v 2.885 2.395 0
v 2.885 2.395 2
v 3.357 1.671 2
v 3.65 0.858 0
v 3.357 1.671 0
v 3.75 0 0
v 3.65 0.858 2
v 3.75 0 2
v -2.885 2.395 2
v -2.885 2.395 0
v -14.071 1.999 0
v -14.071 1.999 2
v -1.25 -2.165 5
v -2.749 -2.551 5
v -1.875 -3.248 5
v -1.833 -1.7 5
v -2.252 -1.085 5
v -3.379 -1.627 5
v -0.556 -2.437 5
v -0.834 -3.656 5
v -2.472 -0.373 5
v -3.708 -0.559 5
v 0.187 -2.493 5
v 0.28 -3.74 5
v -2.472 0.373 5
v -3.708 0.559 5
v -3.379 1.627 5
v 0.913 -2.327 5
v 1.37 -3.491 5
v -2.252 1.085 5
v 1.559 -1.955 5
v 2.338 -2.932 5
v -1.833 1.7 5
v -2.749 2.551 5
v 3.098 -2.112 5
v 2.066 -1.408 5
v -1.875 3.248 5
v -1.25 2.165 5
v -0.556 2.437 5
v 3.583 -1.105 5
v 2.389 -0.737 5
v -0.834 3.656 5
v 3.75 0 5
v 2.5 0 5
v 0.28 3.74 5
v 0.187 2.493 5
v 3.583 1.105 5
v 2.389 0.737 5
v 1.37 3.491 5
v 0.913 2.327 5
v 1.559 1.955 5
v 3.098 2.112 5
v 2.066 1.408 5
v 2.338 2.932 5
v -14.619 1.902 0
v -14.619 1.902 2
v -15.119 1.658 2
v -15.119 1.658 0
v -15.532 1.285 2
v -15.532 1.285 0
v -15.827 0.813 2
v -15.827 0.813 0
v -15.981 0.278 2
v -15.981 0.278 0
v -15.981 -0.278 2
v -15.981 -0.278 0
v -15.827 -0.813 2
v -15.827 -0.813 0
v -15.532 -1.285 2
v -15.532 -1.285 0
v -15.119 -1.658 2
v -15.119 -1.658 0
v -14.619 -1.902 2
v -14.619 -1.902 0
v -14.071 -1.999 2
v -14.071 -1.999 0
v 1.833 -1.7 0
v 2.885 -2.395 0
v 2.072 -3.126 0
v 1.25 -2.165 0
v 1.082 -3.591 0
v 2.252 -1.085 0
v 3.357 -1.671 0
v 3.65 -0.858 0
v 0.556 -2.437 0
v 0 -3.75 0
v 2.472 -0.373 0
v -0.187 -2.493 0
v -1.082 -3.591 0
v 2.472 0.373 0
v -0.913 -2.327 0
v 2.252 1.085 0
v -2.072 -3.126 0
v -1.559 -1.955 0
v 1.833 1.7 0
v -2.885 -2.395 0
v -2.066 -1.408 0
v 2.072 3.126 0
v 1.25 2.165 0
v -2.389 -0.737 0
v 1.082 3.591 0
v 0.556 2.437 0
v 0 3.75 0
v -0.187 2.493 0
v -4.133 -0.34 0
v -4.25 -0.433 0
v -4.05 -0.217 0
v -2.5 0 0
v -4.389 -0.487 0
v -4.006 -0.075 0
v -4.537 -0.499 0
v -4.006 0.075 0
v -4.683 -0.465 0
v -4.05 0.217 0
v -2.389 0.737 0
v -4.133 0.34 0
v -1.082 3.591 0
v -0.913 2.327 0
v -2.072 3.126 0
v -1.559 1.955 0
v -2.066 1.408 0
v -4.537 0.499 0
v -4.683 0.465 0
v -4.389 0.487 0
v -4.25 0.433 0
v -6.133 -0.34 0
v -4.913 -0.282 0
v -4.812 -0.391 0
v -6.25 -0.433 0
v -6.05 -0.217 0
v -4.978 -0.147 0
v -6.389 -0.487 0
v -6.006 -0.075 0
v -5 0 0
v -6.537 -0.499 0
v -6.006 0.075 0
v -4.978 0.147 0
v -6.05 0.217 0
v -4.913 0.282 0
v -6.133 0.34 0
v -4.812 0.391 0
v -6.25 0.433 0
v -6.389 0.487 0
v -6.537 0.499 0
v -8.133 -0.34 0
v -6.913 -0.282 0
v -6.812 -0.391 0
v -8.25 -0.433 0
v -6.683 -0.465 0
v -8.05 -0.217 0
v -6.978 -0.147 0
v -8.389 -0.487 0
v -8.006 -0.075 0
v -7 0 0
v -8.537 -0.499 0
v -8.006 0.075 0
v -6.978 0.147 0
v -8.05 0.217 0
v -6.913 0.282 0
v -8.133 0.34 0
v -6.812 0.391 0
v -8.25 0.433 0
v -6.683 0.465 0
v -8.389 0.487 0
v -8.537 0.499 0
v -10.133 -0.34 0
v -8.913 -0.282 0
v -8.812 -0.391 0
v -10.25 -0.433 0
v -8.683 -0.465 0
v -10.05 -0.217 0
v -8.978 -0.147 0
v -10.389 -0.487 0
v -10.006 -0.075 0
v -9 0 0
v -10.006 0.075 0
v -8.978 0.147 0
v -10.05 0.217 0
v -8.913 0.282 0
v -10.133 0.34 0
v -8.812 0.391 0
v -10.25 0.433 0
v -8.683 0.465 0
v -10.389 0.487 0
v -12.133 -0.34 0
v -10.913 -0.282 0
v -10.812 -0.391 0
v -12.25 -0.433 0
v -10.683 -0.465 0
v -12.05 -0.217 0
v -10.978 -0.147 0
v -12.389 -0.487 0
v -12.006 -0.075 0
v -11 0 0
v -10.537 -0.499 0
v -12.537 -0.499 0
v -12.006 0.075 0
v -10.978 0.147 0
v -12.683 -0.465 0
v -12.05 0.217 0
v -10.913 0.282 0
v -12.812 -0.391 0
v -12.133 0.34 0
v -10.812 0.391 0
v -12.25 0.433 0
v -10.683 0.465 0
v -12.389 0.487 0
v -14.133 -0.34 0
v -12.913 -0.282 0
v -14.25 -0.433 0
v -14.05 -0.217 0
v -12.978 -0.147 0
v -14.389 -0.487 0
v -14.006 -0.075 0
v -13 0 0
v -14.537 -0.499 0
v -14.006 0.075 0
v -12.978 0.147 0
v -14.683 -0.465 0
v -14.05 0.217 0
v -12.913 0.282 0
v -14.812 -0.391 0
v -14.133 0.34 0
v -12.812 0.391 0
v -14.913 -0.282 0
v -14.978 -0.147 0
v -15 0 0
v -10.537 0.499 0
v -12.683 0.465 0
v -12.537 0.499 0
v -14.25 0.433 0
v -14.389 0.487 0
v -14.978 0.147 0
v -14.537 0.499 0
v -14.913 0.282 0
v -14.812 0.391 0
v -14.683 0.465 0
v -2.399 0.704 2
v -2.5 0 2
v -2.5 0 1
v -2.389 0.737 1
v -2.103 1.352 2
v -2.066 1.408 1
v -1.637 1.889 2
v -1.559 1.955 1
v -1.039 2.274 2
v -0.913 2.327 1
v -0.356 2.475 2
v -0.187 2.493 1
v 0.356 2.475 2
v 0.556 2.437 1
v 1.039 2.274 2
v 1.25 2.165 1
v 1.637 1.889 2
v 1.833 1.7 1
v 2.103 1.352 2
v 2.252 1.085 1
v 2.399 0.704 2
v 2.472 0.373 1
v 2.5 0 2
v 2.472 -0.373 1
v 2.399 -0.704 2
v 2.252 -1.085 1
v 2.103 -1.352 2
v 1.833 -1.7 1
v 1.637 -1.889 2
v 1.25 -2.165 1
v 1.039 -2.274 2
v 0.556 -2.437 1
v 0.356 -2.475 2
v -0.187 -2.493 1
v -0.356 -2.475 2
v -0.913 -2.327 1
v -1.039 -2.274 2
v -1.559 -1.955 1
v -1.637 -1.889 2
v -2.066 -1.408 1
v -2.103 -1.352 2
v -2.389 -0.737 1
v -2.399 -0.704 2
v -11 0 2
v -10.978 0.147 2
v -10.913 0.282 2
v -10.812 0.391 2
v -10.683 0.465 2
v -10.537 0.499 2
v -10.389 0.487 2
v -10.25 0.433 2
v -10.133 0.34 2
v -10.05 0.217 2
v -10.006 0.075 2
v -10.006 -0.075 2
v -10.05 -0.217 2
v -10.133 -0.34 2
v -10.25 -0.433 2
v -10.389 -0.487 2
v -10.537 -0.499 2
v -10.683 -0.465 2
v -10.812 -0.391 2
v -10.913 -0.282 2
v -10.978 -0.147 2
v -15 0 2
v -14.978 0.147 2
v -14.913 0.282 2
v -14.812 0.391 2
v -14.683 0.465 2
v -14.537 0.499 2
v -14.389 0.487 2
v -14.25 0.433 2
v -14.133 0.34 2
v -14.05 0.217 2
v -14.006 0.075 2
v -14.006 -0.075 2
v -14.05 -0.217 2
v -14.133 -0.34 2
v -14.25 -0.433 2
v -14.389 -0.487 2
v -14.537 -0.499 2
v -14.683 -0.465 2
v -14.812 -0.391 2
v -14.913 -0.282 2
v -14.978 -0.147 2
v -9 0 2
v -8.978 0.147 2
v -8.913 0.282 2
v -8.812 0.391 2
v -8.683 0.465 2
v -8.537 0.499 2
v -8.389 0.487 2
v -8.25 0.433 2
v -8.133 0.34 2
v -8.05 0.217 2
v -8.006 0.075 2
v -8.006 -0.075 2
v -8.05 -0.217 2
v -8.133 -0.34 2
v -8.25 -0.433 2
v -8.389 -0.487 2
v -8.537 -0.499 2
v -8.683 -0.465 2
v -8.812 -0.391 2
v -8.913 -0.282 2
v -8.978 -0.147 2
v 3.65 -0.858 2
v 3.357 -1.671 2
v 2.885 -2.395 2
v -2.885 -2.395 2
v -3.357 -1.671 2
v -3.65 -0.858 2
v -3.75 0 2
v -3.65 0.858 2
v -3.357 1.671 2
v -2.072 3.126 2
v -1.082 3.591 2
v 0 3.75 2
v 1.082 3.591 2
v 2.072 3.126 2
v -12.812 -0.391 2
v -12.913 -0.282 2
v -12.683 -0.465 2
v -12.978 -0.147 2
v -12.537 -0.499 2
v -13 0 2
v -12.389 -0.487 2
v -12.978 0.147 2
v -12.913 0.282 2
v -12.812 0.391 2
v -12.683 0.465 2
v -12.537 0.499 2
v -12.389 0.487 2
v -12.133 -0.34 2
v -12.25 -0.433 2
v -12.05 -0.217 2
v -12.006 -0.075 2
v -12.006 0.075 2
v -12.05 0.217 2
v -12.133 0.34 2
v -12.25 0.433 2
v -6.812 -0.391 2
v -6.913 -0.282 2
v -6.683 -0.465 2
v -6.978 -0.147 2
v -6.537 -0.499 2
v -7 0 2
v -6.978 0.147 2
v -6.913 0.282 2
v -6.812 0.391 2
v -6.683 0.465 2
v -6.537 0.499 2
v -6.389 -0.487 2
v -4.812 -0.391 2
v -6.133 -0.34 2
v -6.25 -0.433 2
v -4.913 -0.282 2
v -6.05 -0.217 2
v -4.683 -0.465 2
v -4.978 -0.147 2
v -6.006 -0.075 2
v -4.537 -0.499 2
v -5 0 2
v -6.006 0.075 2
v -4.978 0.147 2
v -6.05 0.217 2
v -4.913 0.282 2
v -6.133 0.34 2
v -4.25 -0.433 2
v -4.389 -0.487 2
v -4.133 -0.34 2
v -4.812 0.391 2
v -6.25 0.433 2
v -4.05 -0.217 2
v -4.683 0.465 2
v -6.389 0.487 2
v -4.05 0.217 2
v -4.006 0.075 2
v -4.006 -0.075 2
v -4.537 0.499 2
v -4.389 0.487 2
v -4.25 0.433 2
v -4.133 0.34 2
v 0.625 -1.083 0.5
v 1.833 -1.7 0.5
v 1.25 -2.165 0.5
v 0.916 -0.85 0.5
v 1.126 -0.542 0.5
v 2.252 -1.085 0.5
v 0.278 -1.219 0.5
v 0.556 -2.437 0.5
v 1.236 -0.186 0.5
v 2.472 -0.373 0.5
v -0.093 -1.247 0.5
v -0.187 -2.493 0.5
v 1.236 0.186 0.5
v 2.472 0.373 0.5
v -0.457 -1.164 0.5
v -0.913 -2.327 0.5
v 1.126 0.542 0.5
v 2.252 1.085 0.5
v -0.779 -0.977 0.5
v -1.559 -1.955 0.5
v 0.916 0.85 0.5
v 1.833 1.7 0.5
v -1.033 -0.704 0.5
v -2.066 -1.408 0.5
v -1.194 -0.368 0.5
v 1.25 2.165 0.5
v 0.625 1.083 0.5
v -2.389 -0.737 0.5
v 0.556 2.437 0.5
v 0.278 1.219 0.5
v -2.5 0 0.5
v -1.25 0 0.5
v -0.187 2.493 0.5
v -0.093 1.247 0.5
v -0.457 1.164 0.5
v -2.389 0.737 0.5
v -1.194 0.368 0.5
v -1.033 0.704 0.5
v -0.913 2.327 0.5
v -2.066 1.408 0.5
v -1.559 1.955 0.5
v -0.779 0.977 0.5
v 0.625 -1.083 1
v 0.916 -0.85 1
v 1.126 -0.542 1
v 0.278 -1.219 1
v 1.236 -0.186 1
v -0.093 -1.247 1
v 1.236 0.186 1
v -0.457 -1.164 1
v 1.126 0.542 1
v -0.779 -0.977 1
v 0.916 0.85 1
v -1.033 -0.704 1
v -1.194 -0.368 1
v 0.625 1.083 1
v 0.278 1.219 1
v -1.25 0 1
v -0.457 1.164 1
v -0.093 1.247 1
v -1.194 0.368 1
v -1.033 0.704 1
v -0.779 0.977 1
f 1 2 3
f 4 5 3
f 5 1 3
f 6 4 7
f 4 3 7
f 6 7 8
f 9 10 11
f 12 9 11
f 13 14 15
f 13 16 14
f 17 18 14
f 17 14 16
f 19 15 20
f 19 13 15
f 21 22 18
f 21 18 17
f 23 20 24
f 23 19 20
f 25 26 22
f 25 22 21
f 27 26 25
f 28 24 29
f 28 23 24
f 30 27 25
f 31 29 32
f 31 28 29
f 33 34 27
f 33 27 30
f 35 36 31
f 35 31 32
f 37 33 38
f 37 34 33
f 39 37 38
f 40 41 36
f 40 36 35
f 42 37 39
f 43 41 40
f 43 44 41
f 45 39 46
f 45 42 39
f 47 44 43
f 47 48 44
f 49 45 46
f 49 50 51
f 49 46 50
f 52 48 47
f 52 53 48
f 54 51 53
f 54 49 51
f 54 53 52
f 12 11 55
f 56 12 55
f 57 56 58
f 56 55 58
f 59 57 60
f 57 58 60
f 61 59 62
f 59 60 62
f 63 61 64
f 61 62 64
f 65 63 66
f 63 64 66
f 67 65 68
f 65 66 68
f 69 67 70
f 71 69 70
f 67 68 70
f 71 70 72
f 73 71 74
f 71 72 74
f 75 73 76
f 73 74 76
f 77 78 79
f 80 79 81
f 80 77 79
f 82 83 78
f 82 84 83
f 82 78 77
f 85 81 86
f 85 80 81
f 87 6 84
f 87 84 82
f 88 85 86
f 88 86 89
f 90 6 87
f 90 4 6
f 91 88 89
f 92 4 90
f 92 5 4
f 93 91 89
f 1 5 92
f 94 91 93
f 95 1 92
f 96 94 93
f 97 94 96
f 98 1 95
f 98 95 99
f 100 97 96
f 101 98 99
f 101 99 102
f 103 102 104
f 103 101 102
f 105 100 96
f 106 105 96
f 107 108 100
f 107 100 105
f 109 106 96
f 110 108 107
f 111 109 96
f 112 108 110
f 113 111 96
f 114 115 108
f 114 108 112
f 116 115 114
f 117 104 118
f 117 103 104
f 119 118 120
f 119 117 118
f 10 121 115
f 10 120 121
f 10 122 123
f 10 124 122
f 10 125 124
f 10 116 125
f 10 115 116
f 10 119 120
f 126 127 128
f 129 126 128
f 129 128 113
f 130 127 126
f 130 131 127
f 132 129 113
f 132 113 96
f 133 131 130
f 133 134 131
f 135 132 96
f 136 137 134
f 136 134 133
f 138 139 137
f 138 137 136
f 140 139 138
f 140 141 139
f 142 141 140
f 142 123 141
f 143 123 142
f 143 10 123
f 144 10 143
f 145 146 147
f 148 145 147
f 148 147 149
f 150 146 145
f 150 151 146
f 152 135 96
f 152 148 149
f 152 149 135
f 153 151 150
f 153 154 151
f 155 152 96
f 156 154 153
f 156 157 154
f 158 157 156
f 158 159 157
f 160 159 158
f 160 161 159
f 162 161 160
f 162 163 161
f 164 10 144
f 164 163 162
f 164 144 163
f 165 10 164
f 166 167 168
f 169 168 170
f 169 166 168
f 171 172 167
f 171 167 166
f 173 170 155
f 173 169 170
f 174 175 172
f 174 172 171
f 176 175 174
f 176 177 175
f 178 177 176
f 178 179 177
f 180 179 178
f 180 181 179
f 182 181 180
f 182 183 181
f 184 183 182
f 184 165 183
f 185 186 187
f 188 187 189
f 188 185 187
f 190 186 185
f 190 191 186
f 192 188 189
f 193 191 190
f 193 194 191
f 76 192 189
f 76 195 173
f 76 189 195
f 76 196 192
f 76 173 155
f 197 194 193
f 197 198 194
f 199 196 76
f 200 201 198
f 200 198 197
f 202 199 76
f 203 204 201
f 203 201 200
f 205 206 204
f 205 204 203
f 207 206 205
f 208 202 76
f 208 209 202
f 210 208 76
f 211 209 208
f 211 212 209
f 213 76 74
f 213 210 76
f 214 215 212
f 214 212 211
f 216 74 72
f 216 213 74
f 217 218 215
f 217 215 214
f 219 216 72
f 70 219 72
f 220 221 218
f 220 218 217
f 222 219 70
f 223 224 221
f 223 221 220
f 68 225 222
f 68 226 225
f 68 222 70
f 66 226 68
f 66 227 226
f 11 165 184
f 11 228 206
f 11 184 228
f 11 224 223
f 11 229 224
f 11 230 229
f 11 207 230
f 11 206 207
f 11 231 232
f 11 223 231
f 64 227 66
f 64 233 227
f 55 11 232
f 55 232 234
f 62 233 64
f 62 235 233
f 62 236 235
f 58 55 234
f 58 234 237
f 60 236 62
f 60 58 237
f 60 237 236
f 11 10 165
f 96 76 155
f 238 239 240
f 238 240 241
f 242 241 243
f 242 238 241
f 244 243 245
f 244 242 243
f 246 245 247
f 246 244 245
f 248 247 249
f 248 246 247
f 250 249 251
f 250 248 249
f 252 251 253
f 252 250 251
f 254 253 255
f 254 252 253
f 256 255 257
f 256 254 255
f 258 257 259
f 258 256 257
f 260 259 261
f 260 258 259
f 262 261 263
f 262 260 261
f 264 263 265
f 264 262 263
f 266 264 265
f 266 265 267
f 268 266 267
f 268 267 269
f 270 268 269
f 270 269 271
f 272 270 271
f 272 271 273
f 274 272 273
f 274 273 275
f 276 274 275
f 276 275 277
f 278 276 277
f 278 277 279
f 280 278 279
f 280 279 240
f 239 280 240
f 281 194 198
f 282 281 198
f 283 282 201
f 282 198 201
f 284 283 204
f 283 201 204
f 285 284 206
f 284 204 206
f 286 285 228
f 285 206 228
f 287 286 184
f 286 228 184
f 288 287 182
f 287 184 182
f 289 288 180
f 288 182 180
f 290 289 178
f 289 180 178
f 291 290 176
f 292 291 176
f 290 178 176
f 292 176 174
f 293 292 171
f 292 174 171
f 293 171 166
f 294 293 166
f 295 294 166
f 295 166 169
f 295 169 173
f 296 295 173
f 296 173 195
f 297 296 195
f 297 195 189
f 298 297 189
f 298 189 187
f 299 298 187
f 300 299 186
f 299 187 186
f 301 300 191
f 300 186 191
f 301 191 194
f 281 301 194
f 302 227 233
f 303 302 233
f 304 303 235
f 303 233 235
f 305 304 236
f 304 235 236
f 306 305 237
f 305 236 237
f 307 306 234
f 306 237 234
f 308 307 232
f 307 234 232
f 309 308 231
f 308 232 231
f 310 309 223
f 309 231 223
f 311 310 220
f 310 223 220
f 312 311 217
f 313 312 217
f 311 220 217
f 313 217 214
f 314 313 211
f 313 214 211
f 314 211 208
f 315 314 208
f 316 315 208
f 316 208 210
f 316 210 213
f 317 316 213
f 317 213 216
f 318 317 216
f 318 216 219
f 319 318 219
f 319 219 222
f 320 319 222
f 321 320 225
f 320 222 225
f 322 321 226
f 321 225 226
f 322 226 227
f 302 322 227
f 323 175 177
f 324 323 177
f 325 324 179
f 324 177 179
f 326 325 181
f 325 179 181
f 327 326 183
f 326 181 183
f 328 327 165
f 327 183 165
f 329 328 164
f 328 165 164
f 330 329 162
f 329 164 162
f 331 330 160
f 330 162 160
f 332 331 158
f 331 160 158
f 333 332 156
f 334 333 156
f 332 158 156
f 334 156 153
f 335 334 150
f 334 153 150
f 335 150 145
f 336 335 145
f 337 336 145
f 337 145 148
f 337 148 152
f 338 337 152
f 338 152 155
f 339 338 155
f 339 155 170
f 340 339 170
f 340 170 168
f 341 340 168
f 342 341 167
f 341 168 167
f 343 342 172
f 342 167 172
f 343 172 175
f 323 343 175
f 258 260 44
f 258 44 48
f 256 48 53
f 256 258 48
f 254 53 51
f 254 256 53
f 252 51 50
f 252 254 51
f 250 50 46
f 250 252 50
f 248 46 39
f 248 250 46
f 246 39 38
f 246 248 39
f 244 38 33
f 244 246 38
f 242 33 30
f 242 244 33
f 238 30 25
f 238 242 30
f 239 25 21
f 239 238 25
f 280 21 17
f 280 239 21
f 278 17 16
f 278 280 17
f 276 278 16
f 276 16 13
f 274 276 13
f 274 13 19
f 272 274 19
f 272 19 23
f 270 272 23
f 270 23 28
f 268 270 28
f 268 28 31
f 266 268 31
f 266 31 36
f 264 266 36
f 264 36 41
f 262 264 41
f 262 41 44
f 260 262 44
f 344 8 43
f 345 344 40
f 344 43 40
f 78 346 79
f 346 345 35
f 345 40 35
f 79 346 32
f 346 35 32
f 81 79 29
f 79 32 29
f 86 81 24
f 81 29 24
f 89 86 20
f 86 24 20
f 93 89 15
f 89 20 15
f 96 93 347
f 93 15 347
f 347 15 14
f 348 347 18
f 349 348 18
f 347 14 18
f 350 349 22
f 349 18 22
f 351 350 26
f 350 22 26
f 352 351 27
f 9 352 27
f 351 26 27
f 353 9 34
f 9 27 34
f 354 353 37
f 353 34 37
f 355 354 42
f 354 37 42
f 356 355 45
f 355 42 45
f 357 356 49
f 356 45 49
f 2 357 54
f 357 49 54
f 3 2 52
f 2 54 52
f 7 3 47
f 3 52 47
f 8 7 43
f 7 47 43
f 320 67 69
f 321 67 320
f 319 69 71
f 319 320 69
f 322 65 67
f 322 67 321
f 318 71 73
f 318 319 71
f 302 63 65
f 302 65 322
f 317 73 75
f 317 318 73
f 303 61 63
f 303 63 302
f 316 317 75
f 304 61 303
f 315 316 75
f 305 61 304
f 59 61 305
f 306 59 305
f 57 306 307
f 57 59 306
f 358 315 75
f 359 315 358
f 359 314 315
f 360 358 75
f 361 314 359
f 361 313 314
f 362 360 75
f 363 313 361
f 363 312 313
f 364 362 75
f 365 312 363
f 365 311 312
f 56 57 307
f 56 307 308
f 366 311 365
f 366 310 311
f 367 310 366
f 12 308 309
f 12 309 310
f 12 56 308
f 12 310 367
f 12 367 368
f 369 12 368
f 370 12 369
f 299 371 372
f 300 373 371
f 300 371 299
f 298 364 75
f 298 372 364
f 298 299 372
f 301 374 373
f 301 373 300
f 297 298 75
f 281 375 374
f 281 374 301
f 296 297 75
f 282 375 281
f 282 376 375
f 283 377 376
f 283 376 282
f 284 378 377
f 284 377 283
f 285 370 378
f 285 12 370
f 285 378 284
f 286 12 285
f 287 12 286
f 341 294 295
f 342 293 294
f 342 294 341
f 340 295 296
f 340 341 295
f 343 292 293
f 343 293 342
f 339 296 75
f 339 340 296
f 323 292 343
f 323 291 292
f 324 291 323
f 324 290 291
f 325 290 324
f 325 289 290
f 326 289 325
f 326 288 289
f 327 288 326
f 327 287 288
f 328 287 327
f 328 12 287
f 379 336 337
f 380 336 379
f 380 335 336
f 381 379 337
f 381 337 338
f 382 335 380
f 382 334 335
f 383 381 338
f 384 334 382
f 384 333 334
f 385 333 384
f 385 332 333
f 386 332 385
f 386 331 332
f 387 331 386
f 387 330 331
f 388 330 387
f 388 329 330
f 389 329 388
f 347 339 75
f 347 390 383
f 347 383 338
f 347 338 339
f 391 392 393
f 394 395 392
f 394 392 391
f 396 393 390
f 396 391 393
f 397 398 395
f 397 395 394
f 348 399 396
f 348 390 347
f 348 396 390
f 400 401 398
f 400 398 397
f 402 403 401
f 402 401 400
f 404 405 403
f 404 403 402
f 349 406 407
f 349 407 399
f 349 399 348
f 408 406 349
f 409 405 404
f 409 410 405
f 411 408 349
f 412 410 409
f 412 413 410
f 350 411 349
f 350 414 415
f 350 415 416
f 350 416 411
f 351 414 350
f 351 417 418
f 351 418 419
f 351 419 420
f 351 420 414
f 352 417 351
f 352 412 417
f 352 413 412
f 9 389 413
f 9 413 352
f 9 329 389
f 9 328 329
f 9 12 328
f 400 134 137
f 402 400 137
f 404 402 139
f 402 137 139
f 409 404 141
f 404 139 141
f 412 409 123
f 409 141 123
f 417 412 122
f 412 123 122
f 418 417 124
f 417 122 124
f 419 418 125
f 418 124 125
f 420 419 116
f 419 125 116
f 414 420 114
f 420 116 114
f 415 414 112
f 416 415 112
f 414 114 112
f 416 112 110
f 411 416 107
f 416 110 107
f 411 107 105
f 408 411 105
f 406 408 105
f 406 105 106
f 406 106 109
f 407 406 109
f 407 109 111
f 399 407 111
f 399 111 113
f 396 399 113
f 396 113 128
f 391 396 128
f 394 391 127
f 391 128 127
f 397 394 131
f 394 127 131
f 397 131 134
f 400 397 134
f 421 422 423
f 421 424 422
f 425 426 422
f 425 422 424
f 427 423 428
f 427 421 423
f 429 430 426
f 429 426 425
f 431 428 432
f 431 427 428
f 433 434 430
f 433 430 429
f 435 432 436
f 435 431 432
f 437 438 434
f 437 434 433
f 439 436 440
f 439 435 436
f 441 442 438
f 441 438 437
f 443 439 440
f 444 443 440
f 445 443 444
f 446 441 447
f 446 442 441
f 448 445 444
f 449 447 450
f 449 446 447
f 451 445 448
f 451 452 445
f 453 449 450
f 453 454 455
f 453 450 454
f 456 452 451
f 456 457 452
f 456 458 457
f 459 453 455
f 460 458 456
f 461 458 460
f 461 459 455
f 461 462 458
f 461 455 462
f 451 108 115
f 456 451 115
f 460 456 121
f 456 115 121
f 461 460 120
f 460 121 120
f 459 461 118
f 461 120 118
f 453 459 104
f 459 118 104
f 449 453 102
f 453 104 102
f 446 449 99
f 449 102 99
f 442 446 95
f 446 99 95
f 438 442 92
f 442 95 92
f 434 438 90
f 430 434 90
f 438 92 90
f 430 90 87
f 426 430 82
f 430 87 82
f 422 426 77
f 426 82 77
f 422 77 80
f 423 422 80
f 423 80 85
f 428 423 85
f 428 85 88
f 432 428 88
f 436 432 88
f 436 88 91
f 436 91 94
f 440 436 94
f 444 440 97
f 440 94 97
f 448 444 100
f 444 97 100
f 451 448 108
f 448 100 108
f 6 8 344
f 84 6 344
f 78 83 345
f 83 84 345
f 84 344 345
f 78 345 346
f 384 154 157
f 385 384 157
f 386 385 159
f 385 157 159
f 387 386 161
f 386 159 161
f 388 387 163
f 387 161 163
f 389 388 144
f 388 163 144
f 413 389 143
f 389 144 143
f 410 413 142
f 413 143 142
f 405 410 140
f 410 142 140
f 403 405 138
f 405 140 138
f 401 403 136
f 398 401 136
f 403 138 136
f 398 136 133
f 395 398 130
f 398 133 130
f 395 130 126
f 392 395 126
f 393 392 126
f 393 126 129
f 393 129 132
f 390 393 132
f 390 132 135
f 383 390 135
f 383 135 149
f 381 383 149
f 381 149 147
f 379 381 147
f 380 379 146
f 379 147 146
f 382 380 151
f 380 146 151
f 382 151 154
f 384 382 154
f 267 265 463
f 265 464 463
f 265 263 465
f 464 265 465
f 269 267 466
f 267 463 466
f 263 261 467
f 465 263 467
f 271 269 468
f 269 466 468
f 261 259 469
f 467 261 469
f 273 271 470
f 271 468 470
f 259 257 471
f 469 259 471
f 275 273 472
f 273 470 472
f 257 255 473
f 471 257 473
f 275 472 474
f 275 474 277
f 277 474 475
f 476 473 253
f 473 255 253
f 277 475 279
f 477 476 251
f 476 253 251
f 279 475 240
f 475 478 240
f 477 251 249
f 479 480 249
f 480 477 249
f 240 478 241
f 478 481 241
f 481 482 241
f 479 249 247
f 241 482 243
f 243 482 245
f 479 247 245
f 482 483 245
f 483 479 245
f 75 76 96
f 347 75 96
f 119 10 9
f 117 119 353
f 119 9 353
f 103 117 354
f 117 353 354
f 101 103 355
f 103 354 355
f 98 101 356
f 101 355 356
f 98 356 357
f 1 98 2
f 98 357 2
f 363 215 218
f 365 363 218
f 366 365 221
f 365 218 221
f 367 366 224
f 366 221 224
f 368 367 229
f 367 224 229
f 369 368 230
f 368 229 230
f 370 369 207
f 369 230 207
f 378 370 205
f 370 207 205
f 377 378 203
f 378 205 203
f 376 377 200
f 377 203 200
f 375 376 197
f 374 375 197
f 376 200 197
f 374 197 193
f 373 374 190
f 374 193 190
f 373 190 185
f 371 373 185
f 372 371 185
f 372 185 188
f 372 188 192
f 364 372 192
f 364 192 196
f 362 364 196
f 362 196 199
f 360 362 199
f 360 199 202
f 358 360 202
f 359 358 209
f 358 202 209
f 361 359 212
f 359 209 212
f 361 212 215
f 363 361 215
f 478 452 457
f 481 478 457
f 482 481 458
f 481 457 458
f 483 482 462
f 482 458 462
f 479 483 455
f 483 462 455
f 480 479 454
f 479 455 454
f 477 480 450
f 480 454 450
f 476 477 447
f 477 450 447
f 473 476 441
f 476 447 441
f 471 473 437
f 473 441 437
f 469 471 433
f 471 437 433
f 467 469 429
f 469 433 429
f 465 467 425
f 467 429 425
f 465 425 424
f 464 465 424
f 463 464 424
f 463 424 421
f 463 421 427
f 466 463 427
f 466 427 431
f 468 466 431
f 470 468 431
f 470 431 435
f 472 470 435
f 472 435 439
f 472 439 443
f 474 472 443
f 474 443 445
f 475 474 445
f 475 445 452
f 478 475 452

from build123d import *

# Parameters (mm, degrees)
EXTRUDE_3_DEPTH     = 2
EXTRUDE_3_2_DEPTH   = 2
SKETCH_2_R          = 3.75
SKETCH_2_R_2        = 2.5
EXTRUDE_5_DEPTH     = 3
SKETCH_3_R          = 3.75
SKETCH_3_R_2        = 2.5
EXTRUDE_6_DEPTH     = 2
SKETCH_4_R          = 0.5
CUT_EXTRUDE_1_DEPTH = 2
SKETCH_5_R          = 2.5
EXTRUDE_7_DEPTH     = 1
SKETCH_6_R          = 2.5
CUT_EXTRUDE_2_DEPTH = 0.5
SKETCH_7_R          = 1.25
CUT_EXTRUDE_3_DEPTH = 5
CUT_EXTRUDE1_DEPTH  = 6


with BuildPart() as part:
    # Эскиз1 → Бобышка-Вытянуть3 (new body)
    with BuildSketch(Plane.XY):
        with BuildLine():
            ThreePointArc((-2.885471, -2.395111), (-3.527252, -1.273182), (-3.75, 0))
            ThreePointArc((-3.75, 0), (-3.527252, 1.273182), (-2.885471, 2.395111))
            Line((-2.885471, 2.395111), (-14.070828, 1.998745))
            ThreePointArc((-14.070828, 1.998745), (-16, 0), (-14.070828, -1.998745))
            Line((-14.070828, -1.998745), (-2.885471, -2.395111))
        make_face()
    extrude(amount=EXTRUDE_3_DEPTH)



with BuildPart() as body_2:
    # Эскиз1 → Extrude 3 2 (new body)
    with BuildSketch(Plane.XY):
        with BuildLine():
            Line((14.070828, 1.998745), (2.885471, 2.395111))
            ThreePointArc((2.885471, 2.395111), (3.75, 0), (2.885471, -2.395111))
            Line((2.885471, -2.395111), (14.070828, -1.998745))
            ThreePointArc((14.070828, -1.998745), (16, 0), (14.070828, 1.998745))
        make_face()
    extrude(amount=EXTRUDE_3_2_DEPTH)


with BuildPart() as body_3:
    # Эскиз2 → Бобышка-Вытянуть5 (new body)
    with BuildSketch(Plane.XY.offset(2)):
        Circle(SKETCH_2_R)
        Circle(SKETCH_2_R_2, mode=Mode.SUBTRACT)
    extrude(amount=EXTRUDE_5_DEPTH)


with BuildPart() as part_1:
    add(part.part)

    add(body_2.part)  # Бобышка-Вытянуть6 merges body 2

    add(body_3.part)  # Бобышка-Вытянуть6 merges body 3
    # Эскиз3 → Бобышка-Вытянуть6 (add)
    with BuildSketch(Plane(origin=(0, 0, 2), x_dir=(-1, 0, 0), z_dir=(0, 0, -1))):
        Circle(SKETCH_3_R)
        Circle(SKETCH_3_R_2, mode=Mode.SUBTRACT)
    extrude(amount=EXTRUDE_6_DEPTH)

    # Эскиз4 → Вырез-Вытянуть1 (cut)
    with BuildSketch(Plane(origin=(0, 0, 0), x_dir=(-1, 0, 0), z_dir=(0, 0, -1))):
        with Locations((-14.5, 0)):
            Circle(SKETCH_4_R)
        with Locations((-4.5, 0)):
            Circle(SKETCH_4_R)
        with Locations((-6.5, 0)):
            Circle(SKETCH_4_R)
        with Locations((-8.5, 0)):
            Circle(SKETCH_4_R)
        with Locations((-10.5, 0)):
            Circle(SKETCH_4_R)
        with Locations((-12.5, 0)):
            Circle(SKETCH_4_R)
        with Locations((4.5, 0)):
            Circle(SKETCH_4_R)
        with Locations((6.5, 0)):
            Circle(SKETCH_4_R)
        with Locations((8.5, 0)):
            Circle(SKETCH_4_R)
        with Locations((10.5, 0)):
            Circle(SKETCH_4_R)
        with Locations((12.5, 0)):
            Circle(SKETCH_4_R)
        with Locations((14.5, 0)):
            Circle(SKETCH_4_R)
    extrude(amount=-CUT_EXTRUDE_1_DEPTH, mode=Mode.SUBTRACT)

    # Эскиз5 → Бобышка-Вытянуть7 (add)
    with BuildSketch(Plane(origin=(0, 0, 0), x_dir=(-1, 0, 0), z_dir=(0, 0, -1))):
        Circle(SKETCH_5_R)
    extrude(amount=-EXTRUDE_7_DEPTH)

    # Эскиз6 → Вырез-Вытянуть2 (cut)
    with BuildSketch(Plane(origin=(0, 0, 0), x_dir=(-1, 0, 0), z_dir=(0, 0, -1))):
        Circle(SKETCH_6_R)
    extrude(amount=-CUT_EXTRUDE_2_DEPTH, mode=Mode.SUBTRACT)

    # Эскиз7 → Вырез-Вытянуть3 (cut)
    with BuildSketch(Plane(origin=(0, 0, 0.5), x_dir=(-1, 0, 0), z_dir=(0, 0, -1))):
        Circle(SKETCH_7_R)
    extrude(amount=-CUT_EXTRUDE_3_DEPTH, mode=Mode.SUBTRACT)

    # Sketch1 → Cut-Extrude1 (cut, through all)
    with BuildSketch(Plane.XY.offset(5)):
        with BuildLine():
            ThreePointArc((3.75, 0), (3.527252, -1.273182), (2.885471, -2.395111))
            Line((2.885471, -2.395111), (14.070828, -1.998745))
            ThreePointArc((14.070828, -1.998745), (16, 0), (14.070828, 1.998745))
            Line((14.070828, 1.998745), (2.885471, 2.395111))
            ThreePointArc((2.885471, 2.395111), (3.527252, 1.273182), (3.75, 0))
        make_face()
    extrude(amount=-CUT_EXTRUDE1_DEPTH, mode=Mode.SUBTRACT)


solid = part_1.part
